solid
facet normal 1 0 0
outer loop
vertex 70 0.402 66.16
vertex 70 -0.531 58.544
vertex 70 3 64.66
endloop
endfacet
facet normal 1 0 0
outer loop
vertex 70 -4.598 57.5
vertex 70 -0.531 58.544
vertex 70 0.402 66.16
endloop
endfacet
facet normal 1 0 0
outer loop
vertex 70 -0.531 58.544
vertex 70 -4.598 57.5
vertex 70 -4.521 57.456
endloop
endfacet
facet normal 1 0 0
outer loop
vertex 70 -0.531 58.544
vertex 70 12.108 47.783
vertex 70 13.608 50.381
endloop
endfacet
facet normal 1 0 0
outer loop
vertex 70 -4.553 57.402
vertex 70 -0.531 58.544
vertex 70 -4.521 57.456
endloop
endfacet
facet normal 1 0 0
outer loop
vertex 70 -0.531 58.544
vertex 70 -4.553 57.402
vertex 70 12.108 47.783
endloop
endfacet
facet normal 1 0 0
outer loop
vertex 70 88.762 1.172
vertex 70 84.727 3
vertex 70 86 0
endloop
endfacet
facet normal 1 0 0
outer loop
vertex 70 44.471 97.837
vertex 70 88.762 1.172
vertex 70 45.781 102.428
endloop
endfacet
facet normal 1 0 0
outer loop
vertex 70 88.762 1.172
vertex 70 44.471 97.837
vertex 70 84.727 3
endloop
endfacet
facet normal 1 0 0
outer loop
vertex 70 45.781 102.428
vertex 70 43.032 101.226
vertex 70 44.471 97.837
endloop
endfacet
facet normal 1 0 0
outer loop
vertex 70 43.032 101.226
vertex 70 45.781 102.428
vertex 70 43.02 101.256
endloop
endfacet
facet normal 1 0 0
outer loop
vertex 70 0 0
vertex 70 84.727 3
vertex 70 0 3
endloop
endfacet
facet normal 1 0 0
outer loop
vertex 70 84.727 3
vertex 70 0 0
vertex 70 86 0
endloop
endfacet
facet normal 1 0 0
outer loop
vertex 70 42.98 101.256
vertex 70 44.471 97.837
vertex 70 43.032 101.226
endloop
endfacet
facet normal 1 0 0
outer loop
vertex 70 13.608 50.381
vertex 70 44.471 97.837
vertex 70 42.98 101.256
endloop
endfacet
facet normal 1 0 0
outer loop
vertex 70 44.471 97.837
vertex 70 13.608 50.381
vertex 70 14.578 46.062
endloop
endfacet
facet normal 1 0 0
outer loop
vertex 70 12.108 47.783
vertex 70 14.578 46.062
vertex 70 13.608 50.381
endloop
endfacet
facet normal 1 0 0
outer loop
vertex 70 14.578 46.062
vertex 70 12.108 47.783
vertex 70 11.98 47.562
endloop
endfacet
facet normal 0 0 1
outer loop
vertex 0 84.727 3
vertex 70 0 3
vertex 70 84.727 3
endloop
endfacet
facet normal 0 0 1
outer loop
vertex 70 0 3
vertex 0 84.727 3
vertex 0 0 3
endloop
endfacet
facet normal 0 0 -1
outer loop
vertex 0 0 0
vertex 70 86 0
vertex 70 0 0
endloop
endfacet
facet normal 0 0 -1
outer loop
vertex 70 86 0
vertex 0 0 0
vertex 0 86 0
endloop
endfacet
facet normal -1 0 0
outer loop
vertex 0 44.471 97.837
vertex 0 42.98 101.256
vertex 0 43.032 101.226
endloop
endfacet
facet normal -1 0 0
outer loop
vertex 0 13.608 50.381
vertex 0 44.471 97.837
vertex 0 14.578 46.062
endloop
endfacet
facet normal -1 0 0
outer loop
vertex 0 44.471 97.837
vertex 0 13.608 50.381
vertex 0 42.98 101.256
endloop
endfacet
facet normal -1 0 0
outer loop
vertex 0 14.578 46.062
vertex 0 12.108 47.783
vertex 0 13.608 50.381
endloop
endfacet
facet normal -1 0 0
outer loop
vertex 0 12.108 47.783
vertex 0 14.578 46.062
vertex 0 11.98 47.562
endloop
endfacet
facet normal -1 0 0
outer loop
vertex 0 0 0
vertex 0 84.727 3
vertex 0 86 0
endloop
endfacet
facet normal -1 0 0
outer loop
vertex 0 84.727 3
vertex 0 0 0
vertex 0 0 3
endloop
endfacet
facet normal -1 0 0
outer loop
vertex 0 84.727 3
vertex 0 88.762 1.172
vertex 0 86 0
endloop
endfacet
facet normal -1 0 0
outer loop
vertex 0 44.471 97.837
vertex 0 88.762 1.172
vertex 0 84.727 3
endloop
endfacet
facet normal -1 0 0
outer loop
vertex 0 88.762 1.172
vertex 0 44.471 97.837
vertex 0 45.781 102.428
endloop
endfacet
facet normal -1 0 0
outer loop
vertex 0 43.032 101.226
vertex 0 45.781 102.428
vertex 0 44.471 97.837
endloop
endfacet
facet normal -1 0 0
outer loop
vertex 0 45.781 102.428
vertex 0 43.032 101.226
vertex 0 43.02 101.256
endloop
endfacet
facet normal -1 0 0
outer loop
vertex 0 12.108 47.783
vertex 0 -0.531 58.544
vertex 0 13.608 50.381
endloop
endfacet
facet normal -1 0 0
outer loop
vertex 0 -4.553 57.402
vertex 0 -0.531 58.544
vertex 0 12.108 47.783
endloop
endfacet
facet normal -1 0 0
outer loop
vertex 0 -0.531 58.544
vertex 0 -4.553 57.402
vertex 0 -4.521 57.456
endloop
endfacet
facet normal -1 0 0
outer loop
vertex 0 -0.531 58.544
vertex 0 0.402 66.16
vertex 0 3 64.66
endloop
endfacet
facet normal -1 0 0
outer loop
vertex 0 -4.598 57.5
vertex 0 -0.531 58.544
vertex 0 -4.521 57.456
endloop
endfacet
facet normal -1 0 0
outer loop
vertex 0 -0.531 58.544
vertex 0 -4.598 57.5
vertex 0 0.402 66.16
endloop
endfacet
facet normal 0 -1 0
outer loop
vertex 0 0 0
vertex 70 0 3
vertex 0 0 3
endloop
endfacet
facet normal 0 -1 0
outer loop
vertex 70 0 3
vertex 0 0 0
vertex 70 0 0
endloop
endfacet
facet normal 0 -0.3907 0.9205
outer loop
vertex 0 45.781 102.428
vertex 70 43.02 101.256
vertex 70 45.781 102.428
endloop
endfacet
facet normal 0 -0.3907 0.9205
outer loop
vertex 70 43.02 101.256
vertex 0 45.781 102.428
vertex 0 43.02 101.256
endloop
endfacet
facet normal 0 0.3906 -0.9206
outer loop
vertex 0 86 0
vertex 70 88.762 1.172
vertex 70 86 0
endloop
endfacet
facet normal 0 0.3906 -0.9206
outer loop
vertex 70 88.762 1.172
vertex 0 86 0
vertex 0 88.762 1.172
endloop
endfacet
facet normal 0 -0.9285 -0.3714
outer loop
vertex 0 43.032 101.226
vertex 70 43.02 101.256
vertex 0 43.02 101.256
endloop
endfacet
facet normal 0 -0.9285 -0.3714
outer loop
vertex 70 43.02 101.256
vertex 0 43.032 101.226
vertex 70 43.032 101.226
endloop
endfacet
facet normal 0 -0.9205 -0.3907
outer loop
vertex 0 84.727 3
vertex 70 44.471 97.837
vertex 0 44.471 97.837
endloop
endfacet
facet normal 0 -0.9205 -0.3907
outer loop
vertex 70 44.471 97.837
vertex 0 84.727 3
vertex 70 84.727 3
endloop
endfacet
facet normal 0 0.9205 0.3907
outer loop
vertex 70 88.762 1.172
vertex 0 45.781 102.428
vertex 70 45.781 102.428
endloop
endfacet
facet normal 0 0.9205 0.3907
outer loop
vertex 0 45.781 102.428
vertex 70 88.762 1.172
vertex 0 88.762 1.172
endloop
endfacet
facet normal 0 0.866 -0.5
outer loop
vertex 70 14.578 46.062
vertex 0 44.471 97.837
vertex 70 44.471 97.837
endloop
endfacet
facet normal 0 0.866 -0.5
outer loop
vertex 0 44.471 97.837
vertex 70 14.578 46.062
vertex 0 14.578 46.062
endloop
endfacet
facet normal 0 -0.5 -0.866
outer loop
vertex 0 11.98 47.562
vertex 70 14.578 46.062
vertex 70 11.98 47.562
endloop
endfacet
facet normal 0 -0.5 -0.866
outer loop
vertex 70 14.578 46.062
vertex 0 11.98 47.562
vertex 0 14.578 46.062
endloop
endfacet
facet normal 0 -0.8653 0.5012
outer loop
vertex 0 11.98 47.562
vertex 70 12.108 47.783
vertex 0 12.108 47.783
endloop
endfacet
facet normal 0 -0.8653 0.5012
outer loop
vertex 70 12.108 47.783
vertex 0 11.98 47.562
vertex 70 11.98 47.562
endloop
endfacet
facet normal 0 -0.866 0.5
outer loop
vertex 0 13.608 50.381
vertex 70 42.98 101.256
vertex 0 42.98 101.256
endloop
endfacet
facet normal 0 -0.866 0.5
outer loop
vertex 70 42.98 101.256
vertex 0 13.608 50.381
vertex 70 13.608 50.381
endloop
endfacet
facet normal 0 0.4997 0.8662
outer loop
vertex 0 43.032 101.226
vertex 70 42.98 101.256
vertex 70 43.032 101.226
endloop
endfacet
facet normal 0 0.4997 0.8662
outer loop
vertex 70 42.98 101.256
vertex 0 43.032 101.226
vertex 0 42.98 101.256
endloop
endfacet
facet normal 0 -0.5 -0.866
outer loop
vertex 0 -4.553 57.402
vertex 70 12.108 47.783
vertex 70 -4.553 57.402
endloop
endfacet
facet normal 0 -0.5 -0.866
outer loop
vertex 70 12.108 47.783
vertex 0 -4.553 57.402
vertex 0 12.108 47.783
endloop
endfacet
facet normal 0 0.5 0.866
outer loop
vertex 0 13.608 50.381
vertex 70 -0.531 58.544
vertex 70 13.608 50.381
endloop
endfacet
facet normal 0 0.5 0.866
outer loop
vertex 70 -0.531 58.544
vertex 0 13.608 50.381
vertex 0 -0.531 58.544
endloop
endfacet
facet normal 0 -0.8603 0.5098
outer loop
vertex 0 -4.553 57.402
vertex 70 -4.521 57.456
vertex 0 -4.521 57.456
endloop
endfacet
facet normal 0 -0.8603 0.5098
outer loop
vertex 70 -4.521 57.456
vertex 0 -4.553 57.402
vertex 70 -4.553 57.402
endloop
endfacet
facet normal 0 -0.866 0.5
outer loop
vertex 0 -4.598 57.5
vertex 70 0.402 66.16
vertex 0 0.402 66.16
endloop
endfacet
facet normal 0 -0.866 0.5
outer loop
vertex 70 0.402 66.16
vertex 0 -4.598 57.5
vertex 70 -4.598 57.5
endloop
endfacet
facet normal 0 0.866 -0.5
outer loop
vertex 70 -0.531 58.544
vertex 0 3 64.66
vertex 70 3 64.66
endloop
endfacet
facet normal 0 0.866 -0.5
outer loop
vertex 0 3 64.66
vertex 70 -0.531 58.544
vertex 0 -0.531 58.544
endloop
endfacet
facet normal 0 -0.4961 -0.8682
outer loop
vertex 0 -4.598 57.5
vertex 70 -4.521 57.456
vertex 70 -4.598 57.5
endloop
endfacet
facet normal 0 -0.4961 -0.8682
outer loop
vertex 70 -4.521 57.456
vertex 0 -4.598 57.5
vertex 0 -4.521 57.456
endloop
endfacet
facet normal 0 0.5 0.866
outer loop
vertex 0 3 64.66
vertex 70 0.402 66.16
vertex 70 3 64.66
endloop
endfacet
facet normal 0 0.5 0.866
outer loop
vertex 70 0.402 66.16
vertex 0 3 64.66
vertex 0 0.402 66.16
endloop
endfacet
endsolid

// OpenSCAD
//original
//base_width1 = 70
//base_width2 = 60
//base_length = 86
//base_height = 2

base_width = 70;
base_length = 86;
base_height = 3;

//base
cube([base_width,base_length,base_height]);

back_length = 110;
back_thickness = 3;
back_angle = 23;

//back
translate([0,base_length,0])
rotate(back_angle,[1,0,0])
cube([base_width,back_thickness,back_length]);

front_length = 62;
front_thickness = 3;
front_transY = sin(back_angle) * back_length;
front_transZ = cos(back_angle) * back_length;
front_angle = 240;

//front
translate([0,front_transY, front_transZ])
rotate(front_angle, [1,0,0])
cube([base_width,front_length,front_thickness]);

h_length = 22;

//houder
translate([0,16,49]) //-7, 46?
rotate(150,[1,0,0])
cube([base_width,h_length,base_height]);

s_length  = 10;

//stuff
translate([0,-2,56]) //-7, 46?
rotate(60,[1,0,0])
cube([base_width,s_length,base_height]);
